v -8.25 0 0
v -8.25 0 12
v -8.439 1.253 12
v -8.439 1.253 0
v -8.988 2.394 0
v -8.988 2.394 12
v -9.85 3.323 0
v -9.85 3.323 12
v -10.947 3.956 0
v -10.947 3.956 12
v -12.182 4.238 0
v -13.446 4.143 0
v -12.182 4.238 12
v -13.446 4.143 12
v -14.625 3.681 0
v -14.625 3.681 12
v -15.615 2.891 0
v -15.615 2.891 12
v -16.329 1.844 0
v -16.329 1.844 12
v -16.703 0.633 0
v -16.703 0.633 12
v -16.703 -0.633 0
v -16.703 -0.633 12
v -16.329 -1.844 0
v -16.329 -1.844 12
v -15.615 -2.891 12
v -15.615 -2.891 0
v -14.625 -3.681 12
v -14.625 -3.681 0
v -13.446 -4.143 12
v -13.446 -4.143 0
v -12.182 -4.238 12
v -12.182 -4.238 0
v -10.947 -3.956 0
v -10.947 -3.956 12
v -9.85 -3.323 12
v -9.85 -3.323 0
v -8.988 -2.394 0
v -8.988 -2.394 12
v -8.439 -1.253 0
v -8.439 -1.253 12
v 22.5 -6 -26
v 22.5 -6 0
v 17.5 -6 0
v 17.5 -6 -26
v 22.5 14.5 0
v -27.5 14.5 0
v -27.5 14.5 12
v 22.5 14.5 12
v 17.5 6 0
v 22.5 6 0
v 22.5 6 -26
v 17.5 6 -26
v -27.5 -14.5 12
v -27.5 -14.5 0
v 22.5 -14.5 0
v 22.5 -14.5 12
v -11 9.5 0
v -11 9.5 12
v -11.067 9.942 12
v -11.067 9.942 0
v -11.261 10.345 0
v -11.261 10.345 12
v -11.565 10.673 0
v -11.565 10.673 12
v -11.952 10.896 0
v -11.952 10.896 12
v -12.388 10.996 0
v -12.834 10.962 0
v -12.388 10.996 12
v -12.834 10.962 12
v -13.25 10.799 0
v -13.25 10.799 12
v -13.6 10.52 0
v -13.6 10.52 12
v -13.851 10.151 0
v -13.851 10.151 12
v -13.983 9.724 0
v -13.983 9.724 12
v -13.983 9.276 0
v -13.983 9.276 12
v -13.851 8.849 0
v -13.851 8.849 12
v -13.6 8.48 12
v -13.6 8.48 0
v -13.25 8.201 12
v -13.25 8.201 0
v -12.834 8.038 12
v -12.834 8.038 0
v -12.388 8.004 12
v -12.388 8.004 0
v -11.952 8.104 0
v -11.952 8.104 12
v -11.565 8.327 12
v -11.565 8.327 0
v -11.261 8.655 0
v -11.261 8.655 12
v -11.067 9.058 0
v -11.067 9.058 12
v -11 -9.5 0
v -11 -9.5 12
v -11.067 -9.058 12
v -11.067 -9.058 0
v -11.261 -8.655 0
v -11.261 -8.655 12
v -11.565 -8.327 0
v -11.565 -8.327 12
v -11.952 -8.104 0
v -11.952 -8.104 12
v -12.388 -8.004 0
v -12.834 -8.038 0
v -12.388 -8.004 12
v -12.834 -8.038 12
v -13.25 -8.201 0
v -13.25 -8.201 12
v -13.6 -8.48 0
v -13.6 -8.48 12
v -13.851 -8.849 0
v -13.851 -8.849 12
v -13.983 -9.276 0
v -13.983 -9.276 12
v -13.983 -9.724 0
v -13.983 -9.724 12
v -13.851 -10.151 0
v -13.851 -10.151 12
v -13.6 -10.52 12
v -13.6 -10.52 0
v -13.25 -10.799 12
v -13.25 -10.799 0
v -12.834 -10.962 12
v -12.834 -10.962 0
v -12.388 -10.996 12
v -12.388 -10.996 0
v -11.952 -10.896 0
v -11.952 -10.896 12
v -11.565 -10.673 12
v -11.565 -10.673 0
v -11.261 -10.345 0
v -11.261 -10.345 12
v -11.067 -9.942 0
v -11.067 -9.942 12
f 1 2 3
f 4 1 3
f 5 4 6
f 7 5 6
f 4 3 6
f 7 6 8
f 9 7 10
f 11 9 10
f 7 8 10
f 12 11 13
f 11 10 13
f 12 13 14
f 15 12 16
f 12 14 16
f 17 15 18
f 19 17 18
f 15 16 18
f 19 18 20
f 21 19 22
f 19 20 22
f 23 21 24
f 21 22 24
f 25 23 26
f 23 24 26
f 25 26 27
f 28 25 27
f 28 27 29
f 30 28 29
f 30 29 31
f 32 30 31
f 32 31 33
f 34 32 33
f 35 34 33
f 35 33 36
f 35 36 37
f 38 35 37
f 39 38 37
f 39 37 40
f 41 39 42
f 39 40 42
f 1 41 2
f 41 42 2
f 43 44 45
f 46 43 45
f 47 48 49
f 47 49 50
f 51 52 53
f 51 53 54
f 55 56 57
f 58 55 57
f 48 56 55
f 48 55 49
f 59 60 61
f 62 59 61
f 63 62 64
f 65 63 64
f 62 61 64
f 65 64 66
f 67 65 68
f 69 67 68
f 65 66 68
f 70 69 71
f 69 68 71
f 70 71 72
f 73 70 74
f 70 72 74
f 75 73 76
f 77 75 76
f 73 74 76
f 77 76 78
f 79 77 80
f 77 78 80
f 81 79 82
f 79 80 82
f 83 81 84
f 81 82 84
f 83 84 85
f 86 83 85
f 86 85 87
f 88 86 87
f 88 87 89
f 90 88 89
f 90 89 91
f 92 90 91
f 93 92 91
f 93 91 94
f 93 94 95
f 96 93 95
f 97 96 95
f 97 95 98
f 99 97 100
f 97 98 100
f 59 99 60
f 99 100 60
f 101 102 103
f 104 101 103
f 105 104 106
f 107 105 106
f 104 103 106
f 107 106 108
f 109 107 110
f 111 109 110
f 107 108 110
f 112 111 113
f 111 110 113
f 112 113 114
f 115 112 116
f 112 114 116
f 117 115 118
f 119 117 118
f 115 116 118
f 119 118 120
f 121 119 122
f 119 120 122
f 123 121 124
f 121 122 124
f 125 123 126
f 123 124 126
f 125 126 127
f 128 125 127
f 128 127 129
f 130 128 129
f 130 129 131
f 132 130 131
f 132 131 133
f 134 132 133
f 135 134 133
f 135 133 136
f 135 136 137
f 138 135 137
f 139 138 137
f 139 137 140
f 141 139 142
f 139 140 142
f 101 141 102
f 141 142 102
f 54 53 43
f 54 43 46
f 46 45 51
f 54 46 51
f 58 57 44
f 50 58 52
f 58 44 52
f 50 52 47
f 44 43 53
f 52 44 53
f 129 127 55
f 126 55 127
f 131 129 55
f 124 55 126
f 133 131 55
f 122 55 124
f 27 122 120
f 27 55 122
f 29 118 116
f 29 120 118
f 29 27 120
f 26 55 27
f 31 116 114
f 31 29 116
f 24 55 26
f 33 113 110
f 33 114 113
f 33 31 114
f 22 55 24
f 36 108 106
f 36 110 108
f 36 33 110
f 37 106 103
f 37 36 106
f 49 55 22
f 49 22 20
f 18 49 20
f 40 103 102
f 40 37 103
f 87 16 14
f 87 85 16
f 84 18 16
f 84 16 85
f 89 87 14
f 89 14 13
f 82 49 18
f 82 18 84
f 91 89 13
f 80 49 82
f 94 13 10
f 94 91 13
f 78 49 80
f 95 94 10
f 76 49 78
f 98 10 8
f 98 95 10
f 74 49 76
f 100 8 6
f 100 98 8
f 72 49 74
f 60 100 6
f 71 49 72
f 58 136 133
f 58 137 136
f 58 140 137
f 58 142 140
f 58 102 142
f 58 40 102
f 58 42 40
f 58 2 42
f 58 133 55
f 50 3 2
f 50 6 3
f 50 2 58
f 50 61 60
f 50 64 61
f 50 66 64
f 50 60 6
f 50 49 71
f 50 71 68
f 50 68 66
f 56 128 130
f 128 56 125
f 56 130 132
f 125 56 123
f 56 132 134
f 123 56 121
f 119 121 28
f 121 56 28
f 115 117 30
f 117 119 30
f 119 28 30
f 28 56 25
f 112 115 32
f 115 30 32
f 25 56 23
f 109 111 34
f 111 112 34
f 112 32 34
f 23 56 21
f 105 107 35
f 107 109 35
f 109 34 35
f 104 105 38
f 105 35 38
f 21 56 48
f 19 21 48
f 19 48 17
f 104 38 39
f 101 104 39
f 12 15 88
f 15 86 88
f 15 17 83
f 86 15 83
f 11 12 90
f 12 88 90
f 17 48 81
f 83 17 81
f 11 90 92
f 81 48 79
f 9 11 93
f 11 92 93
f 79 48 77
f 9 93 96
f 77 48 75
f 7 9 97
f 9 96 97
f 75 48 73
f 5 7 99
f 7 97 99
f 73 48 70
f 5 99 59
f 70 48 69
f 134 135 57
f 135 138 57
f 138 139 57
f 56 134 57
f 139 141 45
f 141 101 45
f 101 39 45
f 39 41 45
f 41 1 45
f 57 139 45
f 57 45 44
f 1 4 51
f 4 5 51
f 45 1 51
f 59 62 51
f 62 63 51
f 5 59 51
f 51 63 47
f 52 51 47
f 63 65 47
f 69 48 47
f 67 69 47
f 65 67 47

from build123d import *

# Parameters (mm, degrees)
SKETCH1_W           = 50
SKETCH1_H           = 29
BOSS_EXTRUDE1_DEPTH = 12
SKETCH2_R           = 4.25
CUT_EXTRUDE1_DEPTH  = 12
SKETCH6_R           = 1.5
CUT_EXTRUDE2_DEPTH  = 12
SKETCH3_W           = 5
SKETCH3_H           = 12
BOSS_EXTRUDE2_DEPTH = 26


with BuildPart() as part:
    # Sketch1 → Boss-Extrude1 (new body)
    with BuildSketch(Plane.XY):
        with Locations((-2.5, 0)):
            Rectangle(SKETCH1_W, SKETCH1_H)
    extrude(amount=BOSS_EXTRUDE1_DEPTH)

    # Sketch2 → Cut-Extrude1 (cut)
    with BuildSketch(Plane.XY.offset(12)):
        with Locations((-12.5, 0)):
            Circle(SKETCH2_R)
    extrude(amount=-CUT_EXTRUDE1_DEPTH, mode=Mode.SUBTRACT)

    # Sketch6 → Cut-Extrude2 (cut)
    with BuildSketch(Plane.XY.offset(12)):
        with Locations((-12.5, 9.5)):
            Circle(SKETCH6_R)
        with Locations((-12.5, -9.5)):
            Circle(SKETCH6_R)
    extrude(amount=-CUT_EXTRUDE2_DEPTH, mode=Mode.SUBTRACT)

    # Sketch3 → Boss-Extrude2 (add)
    with BuildSketch(Plane(origin=(0, 0, 0), x_dir=(-1, 0, 0), z_dir=(0, 0, -1))):
        with Locations((-20, 0)):
            Rectangle(SKETCH3_W, SKETCH3_H)
    extrude(amount=BOSS_EXTRUDE2_DEPTH)


solid = part.part
